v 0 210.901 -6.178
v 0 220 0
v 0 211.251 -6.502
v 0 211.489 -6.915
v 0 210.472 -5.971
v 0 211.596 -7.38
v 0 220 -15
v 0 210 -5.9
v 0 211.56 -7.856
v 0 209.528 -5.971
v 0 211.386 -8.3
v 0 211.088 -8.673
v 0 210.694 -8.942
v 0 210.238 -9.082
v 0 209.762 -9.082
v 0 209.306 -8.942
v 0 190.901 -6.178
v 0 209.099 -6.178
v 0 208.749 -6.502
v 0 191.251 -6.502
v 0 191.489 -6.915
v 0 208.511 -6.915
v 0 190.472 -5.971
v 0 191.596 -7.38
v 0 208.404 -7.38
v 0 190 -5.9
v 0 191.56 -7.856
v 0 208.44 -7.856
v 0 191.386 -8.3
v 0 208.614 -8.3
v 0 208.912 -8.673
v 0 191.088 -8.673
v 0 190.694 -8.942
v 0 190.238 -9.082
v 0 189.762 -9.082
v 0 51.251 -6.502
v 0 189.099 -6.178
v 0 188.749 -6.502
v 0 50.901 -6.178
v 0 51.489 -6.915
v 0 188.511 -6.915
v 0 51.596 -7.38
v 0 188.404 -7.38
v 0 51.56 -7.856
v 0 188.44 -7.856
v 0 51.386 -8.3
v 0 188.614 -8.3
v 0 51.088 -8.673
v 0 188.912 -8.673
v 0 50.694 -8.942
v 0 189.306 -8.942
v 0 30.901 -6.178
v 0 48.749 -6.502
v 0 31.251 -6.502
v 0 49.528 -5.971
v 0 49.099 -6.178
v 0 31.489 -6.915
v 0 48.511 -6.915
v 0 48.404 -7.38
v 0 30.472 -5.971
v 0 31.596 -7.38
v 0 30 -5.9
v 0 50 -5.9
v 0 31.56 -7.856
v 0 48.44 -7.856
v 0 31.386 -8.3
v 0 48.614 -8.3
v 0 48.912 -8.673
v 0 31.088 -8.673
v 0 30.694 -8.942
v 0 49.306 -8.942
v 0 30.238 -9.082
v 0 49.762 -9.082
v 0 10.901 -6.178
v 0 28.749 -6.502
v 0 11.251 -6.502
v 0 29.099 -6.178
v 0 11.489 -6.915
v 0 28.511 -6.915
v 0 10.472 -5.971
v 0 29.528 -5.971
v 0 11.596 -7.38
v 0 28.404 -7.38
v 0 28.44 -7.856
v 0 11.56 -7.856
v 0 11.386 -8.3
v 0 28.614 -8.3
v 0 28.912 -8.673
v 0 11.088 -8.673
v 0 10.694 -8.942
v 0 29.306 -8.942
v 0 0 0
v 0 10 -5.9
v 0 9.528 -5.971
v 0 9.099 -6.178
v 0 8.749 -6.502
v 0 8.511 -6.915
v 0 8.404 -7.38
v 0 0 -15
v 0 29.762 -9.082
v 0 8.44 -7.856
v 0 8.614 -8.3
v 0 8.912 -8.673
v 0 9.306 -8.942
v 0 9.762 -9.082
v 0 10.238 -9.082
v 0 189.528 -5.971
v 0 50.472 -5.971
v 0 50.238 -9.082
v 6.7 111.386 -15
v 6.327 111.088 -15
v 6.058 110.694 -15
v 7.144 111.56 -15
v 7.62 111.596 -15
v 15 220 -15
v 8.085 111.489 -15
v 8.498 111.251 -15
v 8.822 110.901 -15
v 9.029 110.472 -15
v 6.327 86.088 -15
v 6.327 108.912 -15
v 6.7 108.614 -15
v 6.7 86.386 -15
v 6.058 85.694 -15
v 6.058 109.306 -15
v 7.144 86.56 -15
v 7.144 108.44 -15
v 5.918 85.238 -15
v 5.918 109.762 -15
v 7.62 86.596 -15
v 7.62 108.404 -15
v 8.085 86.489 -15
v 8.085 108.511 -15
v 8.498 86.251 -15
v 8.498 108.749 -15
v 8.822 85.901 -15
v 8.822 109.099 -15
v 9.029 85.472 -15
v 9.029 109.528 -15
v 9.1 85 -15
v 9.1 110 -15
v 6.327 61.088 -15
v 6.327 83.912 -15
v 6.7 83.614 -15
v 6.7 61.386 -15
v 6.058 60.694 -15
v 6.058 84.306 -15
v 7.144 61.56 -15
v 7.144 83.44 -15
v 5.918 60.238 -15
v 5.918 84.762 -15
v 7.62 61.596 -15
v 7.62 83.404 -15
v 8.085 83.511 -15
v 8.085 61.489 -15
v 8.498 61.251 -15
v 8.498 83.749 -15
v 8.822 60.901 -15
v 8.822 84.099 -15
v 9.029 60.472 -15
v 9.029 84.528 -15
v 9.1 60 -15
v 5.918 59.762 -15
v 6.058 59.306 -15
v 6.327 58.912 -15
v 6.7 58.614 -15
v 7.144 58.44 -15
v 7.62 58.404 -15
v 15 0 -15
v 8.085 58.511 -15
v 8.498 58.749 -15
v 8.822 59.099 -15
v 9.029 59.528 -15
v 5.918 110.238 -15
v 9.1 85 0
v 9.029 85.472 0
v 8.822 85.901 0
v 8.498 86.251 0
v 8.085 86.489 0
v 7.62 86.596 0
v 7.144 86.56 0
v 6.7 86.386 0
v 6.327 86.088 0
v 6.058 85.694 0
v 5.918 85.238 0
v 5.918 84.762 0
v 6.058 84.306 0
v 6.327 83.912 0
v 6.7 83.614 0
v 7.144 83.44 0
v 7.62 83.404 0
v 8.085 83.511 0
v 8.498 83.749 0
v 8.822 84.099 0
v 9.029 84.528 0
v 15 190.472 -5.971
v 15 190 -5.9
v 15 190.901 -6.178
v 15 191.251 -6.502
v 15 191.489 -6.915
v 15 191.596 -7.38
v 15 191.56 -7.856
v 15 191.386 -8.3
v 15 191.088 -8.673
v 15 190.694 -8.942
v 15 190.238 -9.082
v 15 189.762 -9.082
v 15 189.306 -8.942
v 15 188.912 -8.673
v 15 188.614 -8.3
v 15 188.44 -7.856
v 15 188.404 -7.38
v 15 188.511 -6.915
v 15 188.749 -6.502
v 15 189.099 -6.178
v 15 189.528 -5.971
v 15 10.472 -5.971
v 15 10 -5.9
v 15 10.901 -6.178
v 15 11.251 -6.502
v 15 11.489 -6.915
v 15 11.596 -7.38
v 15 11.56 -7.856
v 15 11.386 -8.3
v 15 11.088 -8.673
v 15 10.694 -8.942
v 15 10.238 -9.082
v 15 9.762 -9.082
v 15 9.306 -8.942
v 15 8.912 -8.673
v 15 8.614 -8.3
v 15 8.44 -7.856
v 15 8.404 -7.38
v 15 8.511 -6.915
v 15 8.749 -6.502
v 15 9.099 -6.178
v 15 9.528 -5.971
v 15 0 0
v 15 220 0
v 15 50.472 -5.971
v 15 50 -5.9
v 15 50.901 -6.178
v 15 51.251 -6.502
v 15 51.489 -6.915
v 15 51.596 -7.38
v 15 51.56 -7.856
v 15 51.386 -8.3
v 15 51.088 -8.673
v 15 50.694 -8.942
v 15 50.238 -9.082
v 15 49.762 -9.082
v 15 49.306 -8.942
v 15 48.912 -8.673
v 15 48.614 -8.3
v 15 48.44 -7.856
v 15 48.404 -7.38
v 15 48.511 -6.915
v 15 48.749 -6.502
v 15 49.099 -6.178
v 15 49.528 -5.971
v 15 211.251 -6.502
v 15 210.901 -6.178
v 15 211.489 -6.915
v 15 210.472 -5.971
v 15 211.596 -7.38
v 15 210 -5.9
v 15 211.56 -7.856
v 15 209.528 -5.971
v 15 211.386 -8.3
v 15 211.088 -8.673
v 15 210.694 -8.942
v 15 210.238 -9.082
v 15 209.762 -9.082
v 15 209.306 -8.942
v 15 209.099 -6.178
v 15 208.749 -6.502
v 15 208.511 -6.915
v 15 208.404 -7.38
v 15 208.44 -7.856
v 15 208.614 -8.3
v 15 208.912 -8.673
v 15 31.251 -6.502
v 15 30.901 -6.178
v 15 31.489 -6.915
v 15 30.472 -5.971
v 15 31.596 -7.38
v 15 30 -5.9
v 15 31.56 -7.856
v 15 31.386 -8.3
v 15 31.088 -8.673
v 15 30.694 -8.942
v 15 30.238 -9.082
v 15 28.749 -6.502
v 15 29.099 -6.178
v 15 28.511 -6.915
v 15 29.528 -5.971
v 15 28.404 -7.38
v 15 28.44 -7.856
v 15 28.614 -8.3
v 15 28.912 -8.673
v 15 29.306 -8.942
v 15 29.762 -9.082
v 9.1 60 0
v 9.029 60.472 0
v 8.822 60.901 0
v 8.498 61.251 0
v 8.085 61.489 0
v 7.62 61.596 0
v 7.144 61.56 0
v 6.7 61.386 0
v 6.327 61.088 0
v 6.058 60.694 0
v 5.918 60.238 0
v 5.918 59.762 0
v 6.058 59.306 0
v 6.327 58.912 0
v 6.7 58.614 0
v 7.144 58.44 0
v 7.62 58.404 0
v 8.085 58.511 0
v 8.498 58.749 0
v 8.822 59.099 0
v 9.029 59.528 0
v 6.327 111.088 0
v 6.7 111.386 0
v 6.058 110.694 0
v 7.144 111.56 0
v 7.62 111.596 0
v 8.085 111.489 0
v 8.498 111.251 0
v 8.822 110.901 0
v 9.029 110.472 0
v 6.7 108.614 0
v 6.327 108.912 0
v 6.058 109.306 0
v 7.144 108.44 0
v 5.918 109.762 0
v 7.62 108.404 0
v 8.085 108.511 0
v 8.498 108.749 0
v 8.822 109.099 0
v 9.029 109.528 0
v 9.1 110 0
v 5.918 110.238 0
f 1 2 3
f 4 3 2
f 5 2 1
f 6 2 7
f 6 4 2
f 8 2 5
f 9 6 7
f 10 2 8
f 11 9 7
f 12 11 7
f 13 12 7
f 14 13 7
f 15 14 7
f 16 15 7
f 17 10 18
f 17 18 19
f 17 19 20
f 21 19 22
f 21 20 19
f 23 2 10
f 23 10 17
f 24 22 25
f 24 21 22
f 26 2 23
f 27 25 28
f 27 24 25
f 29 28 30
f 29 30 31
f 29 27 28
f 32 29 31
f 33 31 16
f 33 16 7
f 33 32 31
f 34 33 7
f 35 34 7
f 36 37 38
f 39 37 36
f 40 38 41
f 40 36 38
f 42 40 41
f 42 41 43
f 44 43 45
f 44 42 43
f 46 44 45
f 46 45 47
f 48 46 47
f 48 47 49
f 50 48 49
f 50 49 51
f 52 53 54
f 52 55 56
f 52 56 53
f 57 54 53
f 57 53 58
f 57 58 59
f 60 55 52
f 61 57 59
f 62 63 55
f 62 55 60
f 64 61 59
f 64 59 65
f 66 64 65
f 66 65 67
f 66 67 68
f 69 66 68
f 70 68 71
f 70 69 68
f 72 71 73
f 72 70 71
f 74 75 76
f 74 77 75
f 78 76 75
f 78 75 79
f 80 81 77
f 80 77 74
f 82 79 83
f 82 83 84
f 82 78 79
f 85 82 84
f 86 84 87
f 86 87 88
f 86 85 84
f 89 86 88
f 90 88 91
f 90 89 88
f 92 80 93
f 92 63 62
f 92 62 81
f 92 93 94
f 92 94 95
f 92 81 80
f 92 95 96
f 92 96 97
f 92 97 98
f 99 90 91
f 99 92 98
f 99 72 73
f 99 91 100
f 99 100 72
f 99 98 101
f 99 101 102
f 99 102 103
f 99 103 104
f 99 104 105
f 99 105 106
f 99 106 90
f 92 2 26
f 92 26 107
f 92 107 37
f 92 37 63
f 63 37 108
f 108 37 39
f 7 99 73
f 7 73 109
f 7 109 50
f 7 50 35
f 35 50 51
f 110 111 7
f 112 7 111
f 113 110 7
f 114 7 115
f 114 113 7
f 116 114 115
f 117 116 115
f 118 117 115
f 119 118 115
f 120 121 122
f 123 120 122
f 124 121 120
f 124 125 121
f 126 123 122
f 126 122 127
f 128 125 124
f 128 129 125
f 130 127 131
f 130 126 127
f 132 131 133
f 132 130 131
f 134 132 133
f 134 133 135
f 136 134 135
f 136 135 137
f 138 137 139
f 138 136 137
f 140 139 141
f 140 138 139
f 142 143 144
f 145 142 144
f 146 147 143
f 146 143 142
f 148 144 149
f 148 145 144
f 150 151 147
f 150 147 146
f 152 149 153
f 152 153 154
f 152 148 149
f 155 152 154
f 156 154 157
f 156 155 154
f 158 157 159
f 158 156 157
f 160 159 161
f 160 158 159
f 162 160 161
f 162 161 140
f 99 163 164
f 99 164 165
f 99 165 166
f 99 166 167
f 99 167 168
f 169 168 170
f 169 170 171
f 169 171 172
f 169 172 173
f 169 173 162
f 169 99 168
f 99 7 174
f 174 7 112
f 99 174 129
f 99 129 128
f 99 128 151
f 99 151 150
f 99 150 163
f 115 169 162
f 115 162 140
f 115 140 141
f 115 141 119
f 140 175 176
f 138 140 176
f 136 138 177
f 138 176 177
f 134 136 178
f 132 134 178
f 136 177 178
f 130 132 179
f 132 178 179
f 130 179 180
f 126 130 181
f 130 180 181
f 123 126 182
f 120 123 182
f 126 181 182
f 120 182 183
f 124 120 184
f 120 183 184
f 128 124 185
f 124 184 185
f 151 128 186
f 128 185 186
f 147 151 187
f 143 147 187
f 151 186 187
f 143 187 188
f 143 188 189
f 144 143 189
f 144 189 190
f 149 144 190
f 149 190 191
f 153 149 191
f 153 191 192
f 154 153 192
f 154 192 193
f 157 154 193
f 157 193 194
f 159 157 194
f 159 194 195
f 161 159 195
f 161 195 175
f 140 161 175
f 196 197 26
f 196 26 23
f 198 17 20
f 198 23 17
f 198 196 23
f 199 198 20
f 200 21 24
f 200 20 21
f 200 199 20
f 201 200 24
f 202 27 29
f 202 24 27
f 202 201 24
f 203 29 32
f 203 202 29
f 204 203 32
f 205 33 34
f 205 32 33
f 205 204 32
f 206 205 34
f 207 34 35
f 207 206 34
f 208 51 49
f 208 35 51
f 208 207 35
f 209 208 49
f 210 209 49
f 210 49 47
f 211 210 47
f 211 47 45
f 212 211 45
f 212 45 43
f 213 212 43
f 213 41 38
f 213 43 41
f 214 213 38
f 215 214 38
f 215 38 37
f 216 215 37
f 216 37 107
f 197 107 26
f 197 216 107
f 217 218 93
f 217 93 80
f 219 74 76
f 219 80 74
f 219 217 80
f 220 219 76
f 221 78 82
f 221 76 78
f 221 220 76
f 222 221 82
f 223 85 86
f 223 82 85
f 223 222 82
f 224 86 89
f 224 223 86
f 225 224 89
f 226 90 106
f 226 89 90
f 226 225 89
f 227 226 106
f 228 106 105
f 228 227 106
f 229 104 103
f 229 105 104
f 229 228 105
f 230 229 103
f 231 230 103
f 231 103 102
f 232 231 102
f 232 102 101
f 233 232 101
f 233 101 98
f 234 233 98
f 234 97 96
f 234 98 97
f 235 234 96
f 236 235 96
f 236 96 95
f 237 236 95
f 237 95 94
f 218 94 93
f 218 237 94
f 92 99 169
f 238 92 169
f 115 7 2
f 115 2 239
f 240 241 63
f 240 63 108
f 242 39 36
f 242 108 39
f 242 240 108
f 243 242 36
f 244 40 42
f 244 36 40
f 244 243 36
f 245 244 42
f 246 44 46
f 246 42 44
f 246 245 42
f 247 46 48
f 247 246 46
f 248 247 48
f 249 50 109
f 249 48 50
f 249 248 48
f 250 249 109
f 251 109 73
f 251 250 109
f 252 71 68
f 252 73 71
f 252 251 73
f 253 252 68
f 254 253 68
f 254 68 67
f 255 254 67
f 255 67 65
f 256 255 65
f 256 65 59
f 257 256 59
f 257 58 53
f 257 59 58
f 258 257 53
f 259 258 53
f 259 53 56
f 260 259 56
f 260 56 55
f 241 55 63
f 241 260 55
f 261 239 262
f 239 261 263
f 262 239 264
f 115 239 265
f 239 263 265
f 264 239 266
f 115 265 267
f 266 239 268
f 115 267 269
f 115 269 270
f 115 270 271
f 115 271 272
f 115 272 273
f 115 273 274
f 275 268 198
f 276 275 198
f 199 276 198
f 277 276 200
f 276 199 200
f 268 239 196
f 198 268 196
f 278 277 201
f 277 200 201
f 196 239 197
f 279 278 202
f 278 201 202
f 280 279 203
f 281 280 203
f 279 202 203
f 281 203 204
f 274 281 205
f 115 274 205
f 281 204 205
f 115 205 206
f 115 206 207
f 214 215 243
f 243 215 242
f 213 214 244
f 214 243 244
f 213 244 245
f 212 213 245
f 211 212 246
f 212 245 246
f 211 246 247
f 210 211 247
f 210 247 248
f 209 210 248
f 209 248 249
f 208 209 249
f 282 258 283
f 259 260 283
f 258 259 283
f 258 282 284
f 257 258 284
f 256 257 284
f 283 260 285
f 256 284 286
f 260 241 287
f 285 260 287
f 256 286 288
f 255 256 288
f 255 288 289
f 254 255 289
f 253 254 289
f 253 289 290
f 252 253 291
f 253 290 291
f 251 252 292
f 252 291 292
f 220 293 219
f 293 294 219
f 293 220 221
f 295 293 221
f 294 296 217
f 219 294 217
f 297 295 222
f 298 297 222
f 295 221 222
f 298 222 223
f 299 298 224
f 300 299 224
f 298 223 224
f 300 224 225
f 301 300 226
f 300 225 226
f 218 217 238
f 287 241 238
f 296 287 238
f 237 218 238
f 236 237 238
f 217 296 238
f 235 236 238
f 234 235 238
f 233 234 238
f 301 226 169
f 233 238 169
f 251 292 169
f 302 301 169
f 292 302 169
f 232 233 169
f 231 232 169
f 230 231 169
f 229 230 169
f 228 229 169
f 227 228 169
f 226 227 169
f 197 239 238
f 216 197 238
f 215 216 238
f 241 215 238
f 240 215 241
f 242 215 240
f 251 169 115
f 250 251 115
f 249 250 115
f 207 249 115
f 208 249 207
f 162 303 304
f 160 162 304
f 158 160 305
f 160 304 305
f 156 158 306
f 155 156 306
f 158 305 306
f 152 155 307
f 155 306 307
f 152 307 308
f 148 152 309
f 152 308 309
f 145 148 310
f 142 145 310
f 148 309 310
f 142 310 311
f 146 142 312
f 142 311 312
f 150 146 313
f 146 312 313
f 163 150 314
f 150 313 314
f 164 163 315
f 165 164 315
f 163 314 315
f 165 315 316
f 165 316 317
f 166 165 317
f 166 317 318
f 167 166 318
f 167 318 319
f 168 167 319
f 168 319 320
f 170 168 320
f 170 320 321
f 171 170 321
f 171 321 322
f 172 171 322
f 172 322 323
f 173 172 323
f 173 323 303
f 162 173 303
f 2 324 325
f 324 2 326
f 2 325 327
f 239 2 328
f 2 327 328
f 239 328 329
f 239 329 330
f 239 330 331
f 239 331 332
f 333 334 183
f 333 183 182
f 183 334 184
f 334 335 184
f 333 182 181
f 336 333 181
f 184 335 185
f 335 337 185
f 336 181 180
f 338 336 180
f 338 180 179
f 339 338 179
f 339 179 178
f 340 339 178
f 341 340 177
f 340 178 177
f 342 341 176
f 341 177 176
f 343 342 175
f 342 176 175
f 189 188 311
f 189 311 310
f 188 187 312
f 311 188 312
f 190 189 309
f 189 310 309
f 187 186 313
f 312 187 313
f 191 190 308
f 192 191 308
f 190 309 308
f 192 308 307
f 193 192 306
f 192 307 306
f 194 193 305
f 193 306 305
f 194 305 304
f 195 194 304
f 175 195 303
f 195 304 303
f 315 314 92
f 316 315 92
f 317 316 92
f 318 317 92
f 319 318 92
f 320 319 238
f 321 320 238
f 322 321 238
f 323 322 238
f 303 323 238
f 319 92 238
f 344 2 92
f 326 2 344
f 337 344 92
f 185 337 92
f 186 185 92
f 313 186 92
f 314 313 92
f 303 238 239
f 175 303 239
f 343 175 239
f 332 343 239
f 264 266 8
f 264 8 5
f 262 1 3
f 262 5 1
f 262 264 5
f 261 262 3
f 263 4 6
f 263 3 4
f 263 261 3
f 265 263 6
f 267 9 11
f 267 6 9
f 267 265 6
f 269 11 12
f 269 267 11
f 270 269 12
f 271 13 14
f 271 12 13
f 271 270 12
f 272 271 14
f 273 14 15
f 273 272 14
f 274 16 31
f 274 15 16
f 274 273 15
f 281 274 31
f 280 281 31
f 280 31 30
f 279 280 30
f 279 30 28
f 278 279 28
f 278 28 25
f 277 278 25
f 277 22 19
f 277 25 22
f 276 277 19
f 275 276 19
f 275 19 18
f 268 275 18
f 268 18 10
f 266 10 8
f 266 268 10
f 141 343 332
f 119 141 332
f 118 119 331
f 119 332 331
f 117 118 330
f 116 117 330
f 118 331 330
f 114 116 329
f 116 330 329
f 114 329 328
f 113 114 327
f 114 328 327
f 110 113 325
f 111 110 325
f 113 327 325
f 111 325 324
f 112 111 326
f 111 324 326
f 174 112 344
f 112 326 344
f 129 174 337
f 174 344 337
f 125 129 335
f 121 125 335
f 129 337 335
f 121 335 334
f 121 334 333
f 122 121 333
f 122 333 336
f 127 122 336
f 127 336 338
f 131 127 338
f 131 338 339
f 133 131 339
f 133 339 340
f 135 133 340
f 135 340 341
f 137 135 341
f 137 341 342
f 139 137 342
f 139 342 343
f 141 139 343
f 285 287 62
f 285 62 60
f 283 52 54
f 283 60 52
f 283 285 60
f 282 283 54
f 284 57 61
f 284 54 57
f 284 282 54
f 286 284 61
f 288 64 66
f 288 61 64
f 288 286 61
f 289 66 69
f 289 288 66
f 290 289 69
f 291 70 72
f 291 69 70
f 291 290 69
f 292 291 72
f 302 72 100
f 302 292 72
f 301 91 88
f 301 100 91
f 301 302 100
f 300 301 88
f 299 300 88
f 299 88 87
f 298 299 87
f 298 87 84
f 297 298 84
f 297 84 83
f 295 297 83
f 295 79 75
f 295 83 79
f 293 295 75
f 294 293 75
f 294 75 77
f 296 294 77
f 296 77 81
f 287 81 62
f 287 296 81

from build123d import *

# Parameters (mm, degrees)
SKETCH_1_W               = 15
SKETCH_1_H               = 15
EXTRUDE_1_DEPTH          = 220
SKETCH_2_R               = 1.6
CUT_EXTRUDE_1_DEPTH      = 222.020361053
CUT_EXTRUDE_2_DEPTH      = 222.020361053
CUT_EXTRUDE_2_DEPTH_BACK = 222.020361053
SKETCH_3_R               = 1.6


with BuildPart() as part:
    # 草图1 → 凸台-拉伸1 (new body)
    with BuildSketch(Plane(origin=(0, 0, 0), x_dir=(1, 0, 0), z_dir=(0, 1, 0))):
        with Locations((7.5, 7.5)):
            Rectangle(SKETCH_1_W, SKETCH_1_H)
    extrude(amount=EXTRUDE_1_DEPTH)

    # 草图2 → 切除-拉伸1 (cut, through all)
    with BuildSketch(Plane.XY):
        with Locations((7.5, 60)):
            Circle(SKETCH_2_R)
        with Locations((7.5, 85)):
            Circle(SKETCH_2_R)
        with Locations((7.5, 110)):
            Circle(SKETCH_2_R)
    extrude(amount=-CUT_EXTRUDE_1_DEPTH, mode=Mode.SUBTRACT)

    # 草图3 → 切除-拉伸2 (cut, two sides: drawn at the far end of the back side and taken through both)
    with BuildSketch(Plane.ZY.offset(-CUT_EXTRUDE_2_DEPTH_BACK)):
        with Locations((-7.5, 50)):
            Circle(SKETCH_3_R)
        with Locations((-7.5, 10)):
            Circle(SKETCH_3_R)
        with Locations((-7.5, 30)):
            Circle(SKETCH_3_R)
        with Locations((-7.5, 210)):
            Circle(SKETCH_3_R)
        with Locations((-7.5, 190)):
            Circle(SKETCH_3_R)
    extrude(amount=CUT_EXTRUDE_2_DEPTH + CUT_EXTRUDE_2_DEPTH_BACK, mode=Mode.SUBTRACT)


solid = part.part
